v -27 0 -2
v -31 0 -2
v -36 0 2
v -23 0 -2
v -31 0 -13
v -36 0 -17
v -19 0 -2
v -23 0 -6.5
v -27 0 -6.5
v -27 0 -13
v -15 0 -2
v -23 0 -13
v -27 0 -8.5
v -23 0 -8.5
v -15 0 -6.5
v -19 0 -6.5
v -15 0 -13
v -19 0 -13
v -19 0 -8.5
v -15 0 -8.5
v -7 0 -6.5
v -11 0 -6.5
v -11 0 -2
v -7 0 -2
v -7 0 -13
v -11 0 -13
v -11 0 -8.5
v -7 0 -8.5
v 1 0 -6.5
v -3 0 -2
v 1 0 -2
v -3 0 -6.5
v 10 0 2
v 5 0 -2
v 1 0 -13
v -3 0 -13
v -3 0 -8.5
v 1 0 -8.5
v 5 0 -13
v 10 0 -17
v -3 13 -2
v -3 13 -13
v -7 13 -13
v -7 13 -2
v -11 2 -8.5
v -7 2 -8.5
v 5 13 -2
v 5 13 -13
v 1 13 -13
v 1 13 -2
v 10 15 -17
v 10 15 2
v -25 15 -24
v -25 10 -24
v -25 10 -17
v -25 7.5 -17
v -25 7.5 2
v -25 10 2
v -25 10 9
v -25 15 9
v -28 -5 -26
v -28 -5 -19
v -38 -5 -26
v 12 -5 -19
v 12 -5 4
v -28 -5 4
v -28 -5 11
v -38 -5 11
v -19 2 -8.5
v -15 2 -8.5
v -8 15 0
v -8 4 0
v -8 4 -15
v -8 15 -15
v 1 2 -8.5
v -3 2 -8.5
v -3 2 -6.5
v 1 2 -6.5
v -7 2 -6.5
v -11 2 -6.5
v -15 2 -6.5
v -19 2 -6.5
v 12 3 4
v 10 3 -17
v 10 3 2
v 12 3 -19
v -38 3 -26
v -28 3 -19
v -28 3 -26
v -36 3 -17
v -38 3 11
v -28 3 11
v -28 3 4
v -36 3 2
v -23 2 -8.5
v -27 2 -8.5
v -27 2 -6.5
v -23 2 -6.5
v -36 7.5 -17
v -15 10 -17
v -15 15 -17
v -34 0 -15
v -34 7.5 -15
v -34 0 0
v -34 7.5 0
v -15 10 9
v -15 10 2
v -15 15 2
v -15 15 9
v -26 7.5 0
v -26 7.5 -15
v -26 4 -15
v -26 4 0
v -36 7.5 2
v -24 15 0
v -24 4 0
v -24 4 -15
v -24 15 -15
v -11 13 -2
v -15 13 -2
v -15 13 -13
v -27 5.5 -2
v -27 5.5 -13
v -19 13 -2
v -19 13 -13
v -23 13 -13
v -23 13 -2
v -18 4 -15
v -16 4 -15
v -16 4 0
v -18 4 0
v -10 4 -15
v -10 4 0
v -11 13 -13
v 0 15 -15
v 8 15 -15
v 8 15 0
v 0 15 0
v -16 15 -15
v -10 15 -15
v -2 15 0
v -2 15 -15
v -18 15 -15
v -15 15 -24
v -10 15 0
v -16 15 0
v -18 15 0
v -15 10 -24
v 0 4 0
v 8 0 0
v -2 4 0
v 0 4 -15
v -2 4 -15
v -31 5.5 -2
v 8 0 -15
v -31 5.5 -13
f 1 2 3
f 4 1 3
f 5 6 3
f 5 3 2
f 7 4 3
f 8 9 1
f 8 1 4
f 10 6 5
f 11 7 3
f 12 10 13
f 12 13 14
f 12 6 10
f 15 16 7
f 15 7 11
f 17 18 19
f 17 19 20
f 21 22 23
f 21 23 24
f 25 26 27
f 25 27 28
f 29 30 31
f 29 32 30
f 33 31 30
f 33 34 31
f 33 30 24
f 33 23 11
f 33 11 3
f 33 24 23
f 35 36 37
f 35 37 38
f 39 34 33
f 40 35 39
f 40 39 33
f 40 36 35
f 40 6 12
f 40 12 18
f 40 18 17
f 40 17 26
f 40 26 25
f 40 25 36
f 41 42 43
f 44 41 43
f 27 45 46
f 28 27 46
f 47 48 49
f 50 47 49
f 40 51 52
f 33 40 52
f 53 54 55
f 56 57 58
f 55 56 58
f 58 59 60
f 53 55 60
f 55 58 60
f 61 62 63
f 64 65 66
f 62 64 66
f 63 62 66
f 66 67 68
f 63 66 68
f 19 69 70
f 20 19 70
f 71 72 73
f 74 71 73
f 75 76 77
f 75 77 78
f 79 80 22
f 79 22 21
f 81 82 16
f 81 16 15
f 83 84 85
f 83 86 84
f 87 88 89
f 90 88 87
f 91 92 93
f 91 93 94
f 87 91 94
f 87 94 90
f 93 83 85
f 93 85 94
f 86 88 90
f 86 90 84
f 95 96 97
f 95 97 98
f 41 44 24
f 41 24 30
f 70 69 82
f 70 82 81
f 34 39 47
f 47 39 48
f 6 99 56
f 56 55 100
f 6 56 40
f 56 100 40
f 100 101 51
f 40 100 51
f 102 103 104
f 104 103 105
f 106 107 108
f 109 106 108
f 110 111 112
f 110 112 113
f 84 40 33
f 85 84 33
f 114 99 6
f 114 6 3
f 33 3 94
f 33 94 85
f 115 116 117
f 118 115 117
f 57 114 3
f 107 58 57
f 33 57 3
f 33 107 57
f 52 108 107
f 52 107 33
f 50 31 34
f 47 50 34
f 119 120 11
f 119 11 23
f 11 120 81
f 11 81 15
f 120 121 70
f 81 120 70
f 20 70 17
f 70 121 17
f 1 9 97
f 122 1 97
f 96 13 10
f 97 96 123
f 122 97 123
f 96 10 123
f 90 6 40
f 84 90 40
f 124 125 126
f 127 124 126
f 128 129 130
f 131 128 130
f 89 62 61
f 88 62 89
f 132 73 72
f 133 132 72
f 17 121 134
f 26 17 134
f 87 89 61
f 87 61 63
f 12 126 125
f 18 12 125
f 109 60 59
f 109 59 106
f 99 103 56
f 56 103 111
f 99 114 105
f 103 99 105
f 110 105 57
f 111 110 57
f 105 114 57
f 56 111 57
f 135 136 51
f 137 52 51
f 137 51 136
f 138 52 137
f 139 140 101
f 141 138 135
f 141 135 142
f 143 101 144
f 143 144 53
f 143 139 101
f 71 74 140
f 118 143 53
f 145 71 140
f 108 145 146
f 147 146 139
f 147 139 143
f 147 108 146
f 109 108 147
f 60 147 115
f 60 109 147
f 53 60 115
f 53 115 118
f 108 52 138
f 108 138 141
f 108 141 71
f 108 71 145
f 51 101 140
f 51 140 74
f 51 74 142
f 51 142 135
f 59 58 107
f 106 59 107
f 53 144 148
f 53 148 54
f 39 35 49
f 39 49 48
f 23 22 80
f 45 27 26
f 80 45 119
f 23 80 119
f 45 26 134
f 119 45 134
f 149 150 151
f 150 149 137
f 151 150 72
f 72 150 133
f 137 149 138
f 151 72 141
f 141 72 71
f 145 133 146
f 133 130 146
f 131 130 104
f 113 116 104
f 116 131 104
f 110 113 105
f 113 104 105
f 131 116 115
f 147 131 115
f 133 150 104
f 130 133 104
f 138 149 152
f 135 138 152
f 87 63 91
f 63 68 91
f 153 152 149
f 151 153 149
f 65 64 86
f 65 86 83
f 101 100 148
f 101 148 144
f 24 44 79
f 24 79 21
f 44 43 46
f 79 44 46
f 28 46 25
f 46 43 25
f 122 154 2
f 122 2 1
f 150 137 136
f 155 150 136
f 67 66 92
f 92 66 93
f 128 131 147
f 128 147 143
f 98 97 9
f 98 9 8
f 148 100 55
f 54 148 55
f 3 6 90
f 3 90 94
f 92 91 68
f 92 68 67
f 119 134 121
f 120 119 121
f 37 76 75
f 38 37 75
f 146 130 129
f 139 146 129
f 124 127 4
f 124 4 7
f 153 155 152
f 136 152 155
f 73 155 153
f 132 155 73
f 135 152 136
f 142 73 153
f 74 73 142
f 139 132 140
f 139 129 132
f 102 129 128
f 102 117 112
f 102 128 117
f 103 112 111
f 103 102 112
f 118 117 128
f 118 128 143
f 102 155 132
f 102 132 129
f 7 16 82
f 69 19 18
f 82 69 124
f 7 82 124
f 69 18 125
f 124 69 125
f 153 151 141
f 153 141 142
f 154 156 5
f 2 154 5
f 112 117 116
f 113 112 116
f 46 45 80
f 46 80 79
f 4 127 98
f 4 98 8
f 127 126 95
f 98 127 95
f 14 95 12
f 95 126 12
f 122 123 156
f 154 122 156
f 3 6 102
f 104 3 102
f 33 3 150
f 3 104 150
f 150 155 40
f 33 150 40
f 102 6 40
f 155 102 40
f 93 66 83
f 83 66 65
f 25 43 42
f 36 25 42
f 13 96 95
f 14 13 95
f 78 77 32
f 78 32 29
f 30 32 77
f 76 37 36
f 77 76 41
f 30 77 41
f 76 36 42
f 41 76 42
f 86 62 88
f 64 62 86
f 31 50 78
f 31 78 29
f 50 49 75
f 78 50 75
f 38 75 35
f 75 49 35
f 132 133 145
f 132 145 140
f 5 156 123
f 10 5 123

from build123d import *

# Parameters (mm, degrees)
SKETCH1_W                = 6
SKETCH1_H                = 15
BOSS_EXTRUDE1_DEPTH      = 15
SKETCH2_W                = 4
SKETCH2_H                = 11
CUT_EXTRUDE1_DEPTH       = 13
SKETCH3_W                = 15
SKETCH3_H                = 4
BOSS_EXTRUDE2_DEPTH      = 2
LPATTERN1_COUNT          = 4
LPATTERN1_PITCH          = 8
SKETCH4_W                = 15
SKETCH4_H                = 7.5
BOSS_EXTRUDE3_DEPTH      = 8
SKETCH5_W                = 4
SKETCH5_H                = 11
CUT_EXTRUDE2_DEPTH       = 5.5
SKETCH6_W                = 15
SKETCH6_H                = 15
BOSS_EXTRUDE4_DEPTH      = 2
SKETCH7_W                = 36
SKETCH7_H                = 2
CUT_EXTRUDE3_DEPTH       = 2
BOSS_EXTRUDE5_DEPTH      = 5
BOSS_EXTRUDE5_DEPTH_BACK = 15
SKETCH8_W                = 35
SKETCH8_H                = 19
BOSS_EXTRUDE6_DEPTH      = 5
BOSS_EXTRUDE6_DEPTH_BACK = 7.5
SKETCH9_W                = 11
SKETCH9_H                = 19
SPLIT1_START             = -5
SPLIT1_OUTLINE_W         = 46
SPLIT1_OUTLINE_H         = 19
SPLIT1_DEPTH             = 5
SPLIT1_2_OUTLINE_W       = 4
SPLIT1_2_OUTLINE_H       = 11
SPLIT1_2_DEPTH           = 13
SPLIT1_3_OUTLINE_W       = 4
SPLIT1_3_OUTLINE_H       = 2
SPLIT1_3_DEPTH           = 2
SPLIT1_START_2           = -13
SPLIT1_4_DEPTH           = 11
SPLIT1_START_3           = -17
SPLIT1_5_OUTLINE_W       = 46
SPLIT1_5_OUTLINE_H       = 5
SPLIT1_5_DEPTH           = 19
SPLIT1_START_4           = -8.5
SPLIT1_6_OUTLINE_W       = 4
SPLIT1_6_OUTLINE_H       = 2
SPLIT1_6_DEPTH           = 2
SKETCH15_W               = 10
SKETCH15_H               = 5
BOSS_EXTRUDE13_DEPTH     = 7
SKETCH16_W               = 10
SKETCH16_H               = 5
BOSS_EXTRUDE14_DEPTH     = 7
SKETCH17_W               = 50
SKETCH17_H               = 23
SKETCH17_W_2             = 46
SKETCH17_H_2             = 19
BOSS_EXTRUDE15_DEPTH     = 8
SKETCH18_W               = 10
SKETCH18_H               = 8
BOSS_EXTRUDE16_DEPTH     = 7
SKETCH19_W               = 10
SKETCH19_H               = 8
BOSS_EXTRUDE17_DEPTH     = 7


# Read off the part's stored shape, not the designer's step: Split1
with BuildPart() as part:
    # Sketch1 → Boss-Extrude1 (new body)
    with BuildSketch(Plane(origin=(0, 0, 0), x_dir=(1, 0, 0), z_dir=(0, 1, 0))):
        with Locations((3, 7.5)):
            Rectangle(SKETCH1_W, SKETCH1_H)
    extrude(amount=BOSS_EXTRUDE1_DEPTH)

    # Sketch2 → Cut-Extrude1 (cut)
    with BuildSketch(Plane.XZ):
        with Locations((3, -7.5)):
            Rectangle(SKETCH2_W, SKETCH2_H)
    extrude(amount=-CUT_EXTRUDE1_DEPTH, mode=Mode.SUBTRACT)

    # Sketch3 → Boss-Extrude2 (add)
    with BuildSketch(Plane.ZY):
        with Locations((-7.5, 2)):
            Rectangle(SKETCH3_W, SKETCH3_H)
    extrude(amount=BOSS_EXTRUDE2_DEPTH)


with BuildPart() as lpattern1_1:
    # LPattern1: pattern copy
    add(part.part.moved(Location(Vector(-1, 0, 0) * (1 * LPATTERN1_PITCH))))


with BuildPart() as lpattern1_2:
    # LPattern1: pattern copy
    add(part.part.moved(Location(Vector(-1, 0, 0) * (2 * LPATTERN1_PITCH))))


with BuildPart() as lpattern1_3:
    # LPattern1: pattern copy
    add(part.part.moved(Location(Vector(-1, 0, 0) * (3 * LPATTERN1_PITCH))))

    # Sketch4 → Boss-Extrude3 (add)
    with BuildSketch(Plane.ZY.offset(26)):
        with Locations((-7.5, 3.75)):
            Rectangle(SKETCH4_W, SKETCH4_H)
    extrude(amount=BOSS_EXTRUDE3_DEPTH)

    # Sketch5 → Cut-Extrude2 (cut)
    with BuildSketch(Plane.XZ):
        with Locations((-29, -7.5)):
            Rectangle(SKETCH5_W, SKETCH5_H)
    extrude(amount=-CUT_EXTRUDE2_DEPTH, mode=Mode.SUBTRACT)


with BuildPart() as lpattern1_1_1:
    add(lpattern1_1.part)

    # Combine1: union LPattern1_2, LPattern1_3, part
    add(lpattern1_2.part)
    add(lpattern1_3.part)
    add(part.part)

    # Sketch6 → Boss-Extrude4 (add)
    with BuildSketch(Plane(origin=(6, 0, 0), x_dir=(0, 0, -1), z_dir=(1, 0, 0))):
        with Locations((7.5, 7.5)):
            Rectangle(SKETCH6_W, SKETCH6_H)
    extrude(amount=BOSS_EXTRUDE4_DEPTH)

    # Sketch7 → Cut-Extrude3 (cut)
    with BuildSketch(Plane.XZ):
        with Locations((-13, -7.5)):
            Rectangle(SKETCH7_W, SKETCH7_H)
    extrude(amount=-CUT_EXTRUDE3_DEPTH, mode=Mode.SUBTRACT)


with BuildPart() as body_2:
    # Sketch8 → Boss-Extrude5 (new, two sides: drawn at the far end of the back side and taken through both)
    with BuildSketch(Plane.XZ.offset(-BOSS_EXTRUDE5_DEPTH_BACK)):
        with Locations((-7.5, -7.5)):
            Rectangle(SKETCH8_W, SKETCH8_H)
    extrude(amount=BOSS_EXTRUDE5_DEPTH + BOSS_EXTRUDE5_DEPTH_BACK)


with BuildPart() as body_3:
    # Sketch9 → Boss-Extrude6 (new, two sides: drawn at the far end of the back side and taken through both)
    with BuildSketch(Plane.XZ.offset(-BOSS_EXTRUDE6_DEPTH_BACK)):
        with Locations((-30.5, -7.5)):
            Rectangle(SKETCH9_W, SKETCH9_H)
    extrude(amount=BOSS_EXTRUDE6_DEPTH + BOSS_EXTRUDE6_DEPTH_BACK)


with BuildPart() as body_2_1:
    add(body_2.part)

    # Combine3: union body 3
    add(body_3.part)

    # Combine4: cut LPattern1_1
    add(lpattern1_1_1.part, mode=Mode.SUBTRACT)

    # Split1 outline → Split1 (cut)
    with BuildSketch(Plane(origin=(0, 0, 0), x_dir=(1, 0, 0), z_dir=(0, 1, 0)).offset(SPLIT1_START)):
        with Locations((-13, 7.5)):
            Rectangle(SPLIT1_OUTLINE_W, SPLIT1_OUTLINE_H)
    extrude(amount=SPLIT1_DEPTH, mode=Mode.SUBTRACT)

    # Split1 2 outline → Split1 2 (cut)
    with BuildSketch(Plane(origin=(0, 0, 0), x_dir=(1, 0, 0), z_dir=(0, 1, 0))):
        with Locations((-5, 7.5)):
            Rectangle(SPLIT1_2_OUTLINE_W, SPLIT1_2_OUTLINE_H)
        with Locations((3, 7.5)):
            Rectangle(SPLIT1_2_OUTLINE_W, SPLIT1_2_OUTLINE_H)
        with Locations((-13, 7.5)):
            Rectangle(SPLIT1_2_OUTLINE_W, SPLIT1_2_OUTLINE_H)
        with Locations((-21, 7.5)):
            Rectangle(SPLIT1_2_OUTLINE_W, SPLIT1_2_OUTLINE_H)
        with Locations((-29, 7.5)):
            Rectangle(SPLIT1_2_OUTLINE_W, SPLIT1_2_OUTLINE_H)
    extrude(amount=SPLIT1_2_DEPTH, mode=Mode.SUBTRACT)

    # Split1 3 outline → Split1 3 (cut)
    with BuildSketch(Plane(origin=(0, 0, 0), x_dir=(1, 0, 0), z_dir=(0, 1, 0))):
        with Locations((-1, 7.5)):
            Rectangle(SPLIT1_3_OUTLINE_W, SPLIT1_3_OUTLINE_H)
        with Locations((-9, 7.5)):
            Rectangle(SPLIT1_3_OUTLINE_W, SPLIT1_3_OUTLINE_H)
        with Locations((-17, 7.5)):
            Rectangle(SPLIT1_3_OUTLINE_W, SPLIT1_3_OUTLINE_H)
        with Locations((-25, 7.5)):
            Rectangle(SPLIT1_3_OUTLINE_W, SPLIT1_3_OUTLINE_H)
    extrude(amount=SPLIT1_3_DEPTH, mode=Mode.SUBTRACT)

    # Sketch15 → Boss-Extrude13 (add)
    with BuildSketch(Plane.XY.offset(2)):
        with Locations((-20, 12.5)):
            Rectangle(SKETCH15_W, SKETCH15_H)
    extrude(amount=BOSS_EXTRUDE13_DEPTH)

    # Sketch16 → Boss-Extrude14 (add)
    with BuildSketch(Plane(origin=(0, 0, -17), x_dir=(-1, 0, 0), z_dir=(0, 0, -1))):
        with Locations((20, 12.5)):
            Rectangle(SKETCH16_W, SKETCH16_H)
    extrude(amount=BOSS_EXTRUDE14_DEPTH)


with BuildPart() as body_2_2:
    # Split1 4 outline → Split1 4 (new body)
    with BuildSketch(Plane.XY.offset(SPLIT1_START_2)):
        Polygon((-27, 5.5), (-31, 5.5), (-31, 0), (-36, 0), (-36, -5), (10, -5), (10, 0), (5, 0), (5, 13), (1, 13), (1, 0), (-3, 0), (-3, 13), (-7, 13), (-7, 0), (-11, 0), (-11, 13), (-15, 13), (-15, 0), (-19, 0), (-19, 13), (-23, 13), (-23, 0), (-27, 0), align=None)
    extrude(amount=SPLIT1_4_DEPTH)

    # Split1 5 outline → Split1 5 (add)
    with BuildSketch(Plane.XY.offset(SPLIT1_START_3)):
        with Locations((-13, -2.5)):
            Rectangle(SPLIT1_5_OUTLINE_W, SPLIT1_5_OUTLINE_H)
    extrude(amount=SPLIT1_5_DEPTH)

    # Split1 6 outline → Split1 6 (add)
    with BuildSketch(Plane.XY.offset(SPLIT1_START_4)):
        with Locations((-25, 1)):
            Rectangle(SPLIT1_6_OUTLINE_W, SPLIT1_6_OUTLINE_H)
        with Locations((-17, 1)):
            Rectangle(SPLIT1_6_OUTLINE_W, SPLIT1_6_OUTLINE_H)
        with Locations((-9, 1)):
            Rectangle(SPLIT1_6_OUTLINE_W, SPLIT1_6_OUTLINE_H)
        with Locations((-1, 1)):
            Rectangle(SPLIT1_6_OUTLINE_W, SPLIT1_6_OUTLINE_H)
    extrude(amount=SPLIT1_6_DEPTH)

    # Sketch17 → Boss-Extrude15 (add)
    with BuildSketch(Plane.XZ.offset(5)):
        with Locations((-13, -7.5)):
            Rectangle(SKETCH17_W, SKETCH17_H)
        with Locations((-13, -7.5)):
            Rectangle(SKETCH17_W_2, SKETCH17_H_2, mode=Mode.SUBTRACT)
    extrude(amount=-BOSS_EXTRUDE15_DEPTH)

    # Sketch18 → Boss-Extrude16 (add)
    with BuildSketch(Plane.XY.offset(4)):
        with Locations((-33, -1)):
            Rectangle(SKETCH18_W, SKETCH18_H)
    extrude(amount=BOSS_EXTRUDE16_DEPTH)

    # Sketch19 → Boss-Extrude17 (add)
    with BuildSketch(Plane(origin=(0, 0, -19), x_dir=(-1, 0, 0), z_dir=(0, 0, -1))):
        with Locations((33, -1)):
            Rectangle(SKETCH19_W, SKETCH19_H)
    extrude(amount=BOSS_EXTRUDE17_DEPTH)


solid = Compound([body_2_1.part, body_2_2.part])
